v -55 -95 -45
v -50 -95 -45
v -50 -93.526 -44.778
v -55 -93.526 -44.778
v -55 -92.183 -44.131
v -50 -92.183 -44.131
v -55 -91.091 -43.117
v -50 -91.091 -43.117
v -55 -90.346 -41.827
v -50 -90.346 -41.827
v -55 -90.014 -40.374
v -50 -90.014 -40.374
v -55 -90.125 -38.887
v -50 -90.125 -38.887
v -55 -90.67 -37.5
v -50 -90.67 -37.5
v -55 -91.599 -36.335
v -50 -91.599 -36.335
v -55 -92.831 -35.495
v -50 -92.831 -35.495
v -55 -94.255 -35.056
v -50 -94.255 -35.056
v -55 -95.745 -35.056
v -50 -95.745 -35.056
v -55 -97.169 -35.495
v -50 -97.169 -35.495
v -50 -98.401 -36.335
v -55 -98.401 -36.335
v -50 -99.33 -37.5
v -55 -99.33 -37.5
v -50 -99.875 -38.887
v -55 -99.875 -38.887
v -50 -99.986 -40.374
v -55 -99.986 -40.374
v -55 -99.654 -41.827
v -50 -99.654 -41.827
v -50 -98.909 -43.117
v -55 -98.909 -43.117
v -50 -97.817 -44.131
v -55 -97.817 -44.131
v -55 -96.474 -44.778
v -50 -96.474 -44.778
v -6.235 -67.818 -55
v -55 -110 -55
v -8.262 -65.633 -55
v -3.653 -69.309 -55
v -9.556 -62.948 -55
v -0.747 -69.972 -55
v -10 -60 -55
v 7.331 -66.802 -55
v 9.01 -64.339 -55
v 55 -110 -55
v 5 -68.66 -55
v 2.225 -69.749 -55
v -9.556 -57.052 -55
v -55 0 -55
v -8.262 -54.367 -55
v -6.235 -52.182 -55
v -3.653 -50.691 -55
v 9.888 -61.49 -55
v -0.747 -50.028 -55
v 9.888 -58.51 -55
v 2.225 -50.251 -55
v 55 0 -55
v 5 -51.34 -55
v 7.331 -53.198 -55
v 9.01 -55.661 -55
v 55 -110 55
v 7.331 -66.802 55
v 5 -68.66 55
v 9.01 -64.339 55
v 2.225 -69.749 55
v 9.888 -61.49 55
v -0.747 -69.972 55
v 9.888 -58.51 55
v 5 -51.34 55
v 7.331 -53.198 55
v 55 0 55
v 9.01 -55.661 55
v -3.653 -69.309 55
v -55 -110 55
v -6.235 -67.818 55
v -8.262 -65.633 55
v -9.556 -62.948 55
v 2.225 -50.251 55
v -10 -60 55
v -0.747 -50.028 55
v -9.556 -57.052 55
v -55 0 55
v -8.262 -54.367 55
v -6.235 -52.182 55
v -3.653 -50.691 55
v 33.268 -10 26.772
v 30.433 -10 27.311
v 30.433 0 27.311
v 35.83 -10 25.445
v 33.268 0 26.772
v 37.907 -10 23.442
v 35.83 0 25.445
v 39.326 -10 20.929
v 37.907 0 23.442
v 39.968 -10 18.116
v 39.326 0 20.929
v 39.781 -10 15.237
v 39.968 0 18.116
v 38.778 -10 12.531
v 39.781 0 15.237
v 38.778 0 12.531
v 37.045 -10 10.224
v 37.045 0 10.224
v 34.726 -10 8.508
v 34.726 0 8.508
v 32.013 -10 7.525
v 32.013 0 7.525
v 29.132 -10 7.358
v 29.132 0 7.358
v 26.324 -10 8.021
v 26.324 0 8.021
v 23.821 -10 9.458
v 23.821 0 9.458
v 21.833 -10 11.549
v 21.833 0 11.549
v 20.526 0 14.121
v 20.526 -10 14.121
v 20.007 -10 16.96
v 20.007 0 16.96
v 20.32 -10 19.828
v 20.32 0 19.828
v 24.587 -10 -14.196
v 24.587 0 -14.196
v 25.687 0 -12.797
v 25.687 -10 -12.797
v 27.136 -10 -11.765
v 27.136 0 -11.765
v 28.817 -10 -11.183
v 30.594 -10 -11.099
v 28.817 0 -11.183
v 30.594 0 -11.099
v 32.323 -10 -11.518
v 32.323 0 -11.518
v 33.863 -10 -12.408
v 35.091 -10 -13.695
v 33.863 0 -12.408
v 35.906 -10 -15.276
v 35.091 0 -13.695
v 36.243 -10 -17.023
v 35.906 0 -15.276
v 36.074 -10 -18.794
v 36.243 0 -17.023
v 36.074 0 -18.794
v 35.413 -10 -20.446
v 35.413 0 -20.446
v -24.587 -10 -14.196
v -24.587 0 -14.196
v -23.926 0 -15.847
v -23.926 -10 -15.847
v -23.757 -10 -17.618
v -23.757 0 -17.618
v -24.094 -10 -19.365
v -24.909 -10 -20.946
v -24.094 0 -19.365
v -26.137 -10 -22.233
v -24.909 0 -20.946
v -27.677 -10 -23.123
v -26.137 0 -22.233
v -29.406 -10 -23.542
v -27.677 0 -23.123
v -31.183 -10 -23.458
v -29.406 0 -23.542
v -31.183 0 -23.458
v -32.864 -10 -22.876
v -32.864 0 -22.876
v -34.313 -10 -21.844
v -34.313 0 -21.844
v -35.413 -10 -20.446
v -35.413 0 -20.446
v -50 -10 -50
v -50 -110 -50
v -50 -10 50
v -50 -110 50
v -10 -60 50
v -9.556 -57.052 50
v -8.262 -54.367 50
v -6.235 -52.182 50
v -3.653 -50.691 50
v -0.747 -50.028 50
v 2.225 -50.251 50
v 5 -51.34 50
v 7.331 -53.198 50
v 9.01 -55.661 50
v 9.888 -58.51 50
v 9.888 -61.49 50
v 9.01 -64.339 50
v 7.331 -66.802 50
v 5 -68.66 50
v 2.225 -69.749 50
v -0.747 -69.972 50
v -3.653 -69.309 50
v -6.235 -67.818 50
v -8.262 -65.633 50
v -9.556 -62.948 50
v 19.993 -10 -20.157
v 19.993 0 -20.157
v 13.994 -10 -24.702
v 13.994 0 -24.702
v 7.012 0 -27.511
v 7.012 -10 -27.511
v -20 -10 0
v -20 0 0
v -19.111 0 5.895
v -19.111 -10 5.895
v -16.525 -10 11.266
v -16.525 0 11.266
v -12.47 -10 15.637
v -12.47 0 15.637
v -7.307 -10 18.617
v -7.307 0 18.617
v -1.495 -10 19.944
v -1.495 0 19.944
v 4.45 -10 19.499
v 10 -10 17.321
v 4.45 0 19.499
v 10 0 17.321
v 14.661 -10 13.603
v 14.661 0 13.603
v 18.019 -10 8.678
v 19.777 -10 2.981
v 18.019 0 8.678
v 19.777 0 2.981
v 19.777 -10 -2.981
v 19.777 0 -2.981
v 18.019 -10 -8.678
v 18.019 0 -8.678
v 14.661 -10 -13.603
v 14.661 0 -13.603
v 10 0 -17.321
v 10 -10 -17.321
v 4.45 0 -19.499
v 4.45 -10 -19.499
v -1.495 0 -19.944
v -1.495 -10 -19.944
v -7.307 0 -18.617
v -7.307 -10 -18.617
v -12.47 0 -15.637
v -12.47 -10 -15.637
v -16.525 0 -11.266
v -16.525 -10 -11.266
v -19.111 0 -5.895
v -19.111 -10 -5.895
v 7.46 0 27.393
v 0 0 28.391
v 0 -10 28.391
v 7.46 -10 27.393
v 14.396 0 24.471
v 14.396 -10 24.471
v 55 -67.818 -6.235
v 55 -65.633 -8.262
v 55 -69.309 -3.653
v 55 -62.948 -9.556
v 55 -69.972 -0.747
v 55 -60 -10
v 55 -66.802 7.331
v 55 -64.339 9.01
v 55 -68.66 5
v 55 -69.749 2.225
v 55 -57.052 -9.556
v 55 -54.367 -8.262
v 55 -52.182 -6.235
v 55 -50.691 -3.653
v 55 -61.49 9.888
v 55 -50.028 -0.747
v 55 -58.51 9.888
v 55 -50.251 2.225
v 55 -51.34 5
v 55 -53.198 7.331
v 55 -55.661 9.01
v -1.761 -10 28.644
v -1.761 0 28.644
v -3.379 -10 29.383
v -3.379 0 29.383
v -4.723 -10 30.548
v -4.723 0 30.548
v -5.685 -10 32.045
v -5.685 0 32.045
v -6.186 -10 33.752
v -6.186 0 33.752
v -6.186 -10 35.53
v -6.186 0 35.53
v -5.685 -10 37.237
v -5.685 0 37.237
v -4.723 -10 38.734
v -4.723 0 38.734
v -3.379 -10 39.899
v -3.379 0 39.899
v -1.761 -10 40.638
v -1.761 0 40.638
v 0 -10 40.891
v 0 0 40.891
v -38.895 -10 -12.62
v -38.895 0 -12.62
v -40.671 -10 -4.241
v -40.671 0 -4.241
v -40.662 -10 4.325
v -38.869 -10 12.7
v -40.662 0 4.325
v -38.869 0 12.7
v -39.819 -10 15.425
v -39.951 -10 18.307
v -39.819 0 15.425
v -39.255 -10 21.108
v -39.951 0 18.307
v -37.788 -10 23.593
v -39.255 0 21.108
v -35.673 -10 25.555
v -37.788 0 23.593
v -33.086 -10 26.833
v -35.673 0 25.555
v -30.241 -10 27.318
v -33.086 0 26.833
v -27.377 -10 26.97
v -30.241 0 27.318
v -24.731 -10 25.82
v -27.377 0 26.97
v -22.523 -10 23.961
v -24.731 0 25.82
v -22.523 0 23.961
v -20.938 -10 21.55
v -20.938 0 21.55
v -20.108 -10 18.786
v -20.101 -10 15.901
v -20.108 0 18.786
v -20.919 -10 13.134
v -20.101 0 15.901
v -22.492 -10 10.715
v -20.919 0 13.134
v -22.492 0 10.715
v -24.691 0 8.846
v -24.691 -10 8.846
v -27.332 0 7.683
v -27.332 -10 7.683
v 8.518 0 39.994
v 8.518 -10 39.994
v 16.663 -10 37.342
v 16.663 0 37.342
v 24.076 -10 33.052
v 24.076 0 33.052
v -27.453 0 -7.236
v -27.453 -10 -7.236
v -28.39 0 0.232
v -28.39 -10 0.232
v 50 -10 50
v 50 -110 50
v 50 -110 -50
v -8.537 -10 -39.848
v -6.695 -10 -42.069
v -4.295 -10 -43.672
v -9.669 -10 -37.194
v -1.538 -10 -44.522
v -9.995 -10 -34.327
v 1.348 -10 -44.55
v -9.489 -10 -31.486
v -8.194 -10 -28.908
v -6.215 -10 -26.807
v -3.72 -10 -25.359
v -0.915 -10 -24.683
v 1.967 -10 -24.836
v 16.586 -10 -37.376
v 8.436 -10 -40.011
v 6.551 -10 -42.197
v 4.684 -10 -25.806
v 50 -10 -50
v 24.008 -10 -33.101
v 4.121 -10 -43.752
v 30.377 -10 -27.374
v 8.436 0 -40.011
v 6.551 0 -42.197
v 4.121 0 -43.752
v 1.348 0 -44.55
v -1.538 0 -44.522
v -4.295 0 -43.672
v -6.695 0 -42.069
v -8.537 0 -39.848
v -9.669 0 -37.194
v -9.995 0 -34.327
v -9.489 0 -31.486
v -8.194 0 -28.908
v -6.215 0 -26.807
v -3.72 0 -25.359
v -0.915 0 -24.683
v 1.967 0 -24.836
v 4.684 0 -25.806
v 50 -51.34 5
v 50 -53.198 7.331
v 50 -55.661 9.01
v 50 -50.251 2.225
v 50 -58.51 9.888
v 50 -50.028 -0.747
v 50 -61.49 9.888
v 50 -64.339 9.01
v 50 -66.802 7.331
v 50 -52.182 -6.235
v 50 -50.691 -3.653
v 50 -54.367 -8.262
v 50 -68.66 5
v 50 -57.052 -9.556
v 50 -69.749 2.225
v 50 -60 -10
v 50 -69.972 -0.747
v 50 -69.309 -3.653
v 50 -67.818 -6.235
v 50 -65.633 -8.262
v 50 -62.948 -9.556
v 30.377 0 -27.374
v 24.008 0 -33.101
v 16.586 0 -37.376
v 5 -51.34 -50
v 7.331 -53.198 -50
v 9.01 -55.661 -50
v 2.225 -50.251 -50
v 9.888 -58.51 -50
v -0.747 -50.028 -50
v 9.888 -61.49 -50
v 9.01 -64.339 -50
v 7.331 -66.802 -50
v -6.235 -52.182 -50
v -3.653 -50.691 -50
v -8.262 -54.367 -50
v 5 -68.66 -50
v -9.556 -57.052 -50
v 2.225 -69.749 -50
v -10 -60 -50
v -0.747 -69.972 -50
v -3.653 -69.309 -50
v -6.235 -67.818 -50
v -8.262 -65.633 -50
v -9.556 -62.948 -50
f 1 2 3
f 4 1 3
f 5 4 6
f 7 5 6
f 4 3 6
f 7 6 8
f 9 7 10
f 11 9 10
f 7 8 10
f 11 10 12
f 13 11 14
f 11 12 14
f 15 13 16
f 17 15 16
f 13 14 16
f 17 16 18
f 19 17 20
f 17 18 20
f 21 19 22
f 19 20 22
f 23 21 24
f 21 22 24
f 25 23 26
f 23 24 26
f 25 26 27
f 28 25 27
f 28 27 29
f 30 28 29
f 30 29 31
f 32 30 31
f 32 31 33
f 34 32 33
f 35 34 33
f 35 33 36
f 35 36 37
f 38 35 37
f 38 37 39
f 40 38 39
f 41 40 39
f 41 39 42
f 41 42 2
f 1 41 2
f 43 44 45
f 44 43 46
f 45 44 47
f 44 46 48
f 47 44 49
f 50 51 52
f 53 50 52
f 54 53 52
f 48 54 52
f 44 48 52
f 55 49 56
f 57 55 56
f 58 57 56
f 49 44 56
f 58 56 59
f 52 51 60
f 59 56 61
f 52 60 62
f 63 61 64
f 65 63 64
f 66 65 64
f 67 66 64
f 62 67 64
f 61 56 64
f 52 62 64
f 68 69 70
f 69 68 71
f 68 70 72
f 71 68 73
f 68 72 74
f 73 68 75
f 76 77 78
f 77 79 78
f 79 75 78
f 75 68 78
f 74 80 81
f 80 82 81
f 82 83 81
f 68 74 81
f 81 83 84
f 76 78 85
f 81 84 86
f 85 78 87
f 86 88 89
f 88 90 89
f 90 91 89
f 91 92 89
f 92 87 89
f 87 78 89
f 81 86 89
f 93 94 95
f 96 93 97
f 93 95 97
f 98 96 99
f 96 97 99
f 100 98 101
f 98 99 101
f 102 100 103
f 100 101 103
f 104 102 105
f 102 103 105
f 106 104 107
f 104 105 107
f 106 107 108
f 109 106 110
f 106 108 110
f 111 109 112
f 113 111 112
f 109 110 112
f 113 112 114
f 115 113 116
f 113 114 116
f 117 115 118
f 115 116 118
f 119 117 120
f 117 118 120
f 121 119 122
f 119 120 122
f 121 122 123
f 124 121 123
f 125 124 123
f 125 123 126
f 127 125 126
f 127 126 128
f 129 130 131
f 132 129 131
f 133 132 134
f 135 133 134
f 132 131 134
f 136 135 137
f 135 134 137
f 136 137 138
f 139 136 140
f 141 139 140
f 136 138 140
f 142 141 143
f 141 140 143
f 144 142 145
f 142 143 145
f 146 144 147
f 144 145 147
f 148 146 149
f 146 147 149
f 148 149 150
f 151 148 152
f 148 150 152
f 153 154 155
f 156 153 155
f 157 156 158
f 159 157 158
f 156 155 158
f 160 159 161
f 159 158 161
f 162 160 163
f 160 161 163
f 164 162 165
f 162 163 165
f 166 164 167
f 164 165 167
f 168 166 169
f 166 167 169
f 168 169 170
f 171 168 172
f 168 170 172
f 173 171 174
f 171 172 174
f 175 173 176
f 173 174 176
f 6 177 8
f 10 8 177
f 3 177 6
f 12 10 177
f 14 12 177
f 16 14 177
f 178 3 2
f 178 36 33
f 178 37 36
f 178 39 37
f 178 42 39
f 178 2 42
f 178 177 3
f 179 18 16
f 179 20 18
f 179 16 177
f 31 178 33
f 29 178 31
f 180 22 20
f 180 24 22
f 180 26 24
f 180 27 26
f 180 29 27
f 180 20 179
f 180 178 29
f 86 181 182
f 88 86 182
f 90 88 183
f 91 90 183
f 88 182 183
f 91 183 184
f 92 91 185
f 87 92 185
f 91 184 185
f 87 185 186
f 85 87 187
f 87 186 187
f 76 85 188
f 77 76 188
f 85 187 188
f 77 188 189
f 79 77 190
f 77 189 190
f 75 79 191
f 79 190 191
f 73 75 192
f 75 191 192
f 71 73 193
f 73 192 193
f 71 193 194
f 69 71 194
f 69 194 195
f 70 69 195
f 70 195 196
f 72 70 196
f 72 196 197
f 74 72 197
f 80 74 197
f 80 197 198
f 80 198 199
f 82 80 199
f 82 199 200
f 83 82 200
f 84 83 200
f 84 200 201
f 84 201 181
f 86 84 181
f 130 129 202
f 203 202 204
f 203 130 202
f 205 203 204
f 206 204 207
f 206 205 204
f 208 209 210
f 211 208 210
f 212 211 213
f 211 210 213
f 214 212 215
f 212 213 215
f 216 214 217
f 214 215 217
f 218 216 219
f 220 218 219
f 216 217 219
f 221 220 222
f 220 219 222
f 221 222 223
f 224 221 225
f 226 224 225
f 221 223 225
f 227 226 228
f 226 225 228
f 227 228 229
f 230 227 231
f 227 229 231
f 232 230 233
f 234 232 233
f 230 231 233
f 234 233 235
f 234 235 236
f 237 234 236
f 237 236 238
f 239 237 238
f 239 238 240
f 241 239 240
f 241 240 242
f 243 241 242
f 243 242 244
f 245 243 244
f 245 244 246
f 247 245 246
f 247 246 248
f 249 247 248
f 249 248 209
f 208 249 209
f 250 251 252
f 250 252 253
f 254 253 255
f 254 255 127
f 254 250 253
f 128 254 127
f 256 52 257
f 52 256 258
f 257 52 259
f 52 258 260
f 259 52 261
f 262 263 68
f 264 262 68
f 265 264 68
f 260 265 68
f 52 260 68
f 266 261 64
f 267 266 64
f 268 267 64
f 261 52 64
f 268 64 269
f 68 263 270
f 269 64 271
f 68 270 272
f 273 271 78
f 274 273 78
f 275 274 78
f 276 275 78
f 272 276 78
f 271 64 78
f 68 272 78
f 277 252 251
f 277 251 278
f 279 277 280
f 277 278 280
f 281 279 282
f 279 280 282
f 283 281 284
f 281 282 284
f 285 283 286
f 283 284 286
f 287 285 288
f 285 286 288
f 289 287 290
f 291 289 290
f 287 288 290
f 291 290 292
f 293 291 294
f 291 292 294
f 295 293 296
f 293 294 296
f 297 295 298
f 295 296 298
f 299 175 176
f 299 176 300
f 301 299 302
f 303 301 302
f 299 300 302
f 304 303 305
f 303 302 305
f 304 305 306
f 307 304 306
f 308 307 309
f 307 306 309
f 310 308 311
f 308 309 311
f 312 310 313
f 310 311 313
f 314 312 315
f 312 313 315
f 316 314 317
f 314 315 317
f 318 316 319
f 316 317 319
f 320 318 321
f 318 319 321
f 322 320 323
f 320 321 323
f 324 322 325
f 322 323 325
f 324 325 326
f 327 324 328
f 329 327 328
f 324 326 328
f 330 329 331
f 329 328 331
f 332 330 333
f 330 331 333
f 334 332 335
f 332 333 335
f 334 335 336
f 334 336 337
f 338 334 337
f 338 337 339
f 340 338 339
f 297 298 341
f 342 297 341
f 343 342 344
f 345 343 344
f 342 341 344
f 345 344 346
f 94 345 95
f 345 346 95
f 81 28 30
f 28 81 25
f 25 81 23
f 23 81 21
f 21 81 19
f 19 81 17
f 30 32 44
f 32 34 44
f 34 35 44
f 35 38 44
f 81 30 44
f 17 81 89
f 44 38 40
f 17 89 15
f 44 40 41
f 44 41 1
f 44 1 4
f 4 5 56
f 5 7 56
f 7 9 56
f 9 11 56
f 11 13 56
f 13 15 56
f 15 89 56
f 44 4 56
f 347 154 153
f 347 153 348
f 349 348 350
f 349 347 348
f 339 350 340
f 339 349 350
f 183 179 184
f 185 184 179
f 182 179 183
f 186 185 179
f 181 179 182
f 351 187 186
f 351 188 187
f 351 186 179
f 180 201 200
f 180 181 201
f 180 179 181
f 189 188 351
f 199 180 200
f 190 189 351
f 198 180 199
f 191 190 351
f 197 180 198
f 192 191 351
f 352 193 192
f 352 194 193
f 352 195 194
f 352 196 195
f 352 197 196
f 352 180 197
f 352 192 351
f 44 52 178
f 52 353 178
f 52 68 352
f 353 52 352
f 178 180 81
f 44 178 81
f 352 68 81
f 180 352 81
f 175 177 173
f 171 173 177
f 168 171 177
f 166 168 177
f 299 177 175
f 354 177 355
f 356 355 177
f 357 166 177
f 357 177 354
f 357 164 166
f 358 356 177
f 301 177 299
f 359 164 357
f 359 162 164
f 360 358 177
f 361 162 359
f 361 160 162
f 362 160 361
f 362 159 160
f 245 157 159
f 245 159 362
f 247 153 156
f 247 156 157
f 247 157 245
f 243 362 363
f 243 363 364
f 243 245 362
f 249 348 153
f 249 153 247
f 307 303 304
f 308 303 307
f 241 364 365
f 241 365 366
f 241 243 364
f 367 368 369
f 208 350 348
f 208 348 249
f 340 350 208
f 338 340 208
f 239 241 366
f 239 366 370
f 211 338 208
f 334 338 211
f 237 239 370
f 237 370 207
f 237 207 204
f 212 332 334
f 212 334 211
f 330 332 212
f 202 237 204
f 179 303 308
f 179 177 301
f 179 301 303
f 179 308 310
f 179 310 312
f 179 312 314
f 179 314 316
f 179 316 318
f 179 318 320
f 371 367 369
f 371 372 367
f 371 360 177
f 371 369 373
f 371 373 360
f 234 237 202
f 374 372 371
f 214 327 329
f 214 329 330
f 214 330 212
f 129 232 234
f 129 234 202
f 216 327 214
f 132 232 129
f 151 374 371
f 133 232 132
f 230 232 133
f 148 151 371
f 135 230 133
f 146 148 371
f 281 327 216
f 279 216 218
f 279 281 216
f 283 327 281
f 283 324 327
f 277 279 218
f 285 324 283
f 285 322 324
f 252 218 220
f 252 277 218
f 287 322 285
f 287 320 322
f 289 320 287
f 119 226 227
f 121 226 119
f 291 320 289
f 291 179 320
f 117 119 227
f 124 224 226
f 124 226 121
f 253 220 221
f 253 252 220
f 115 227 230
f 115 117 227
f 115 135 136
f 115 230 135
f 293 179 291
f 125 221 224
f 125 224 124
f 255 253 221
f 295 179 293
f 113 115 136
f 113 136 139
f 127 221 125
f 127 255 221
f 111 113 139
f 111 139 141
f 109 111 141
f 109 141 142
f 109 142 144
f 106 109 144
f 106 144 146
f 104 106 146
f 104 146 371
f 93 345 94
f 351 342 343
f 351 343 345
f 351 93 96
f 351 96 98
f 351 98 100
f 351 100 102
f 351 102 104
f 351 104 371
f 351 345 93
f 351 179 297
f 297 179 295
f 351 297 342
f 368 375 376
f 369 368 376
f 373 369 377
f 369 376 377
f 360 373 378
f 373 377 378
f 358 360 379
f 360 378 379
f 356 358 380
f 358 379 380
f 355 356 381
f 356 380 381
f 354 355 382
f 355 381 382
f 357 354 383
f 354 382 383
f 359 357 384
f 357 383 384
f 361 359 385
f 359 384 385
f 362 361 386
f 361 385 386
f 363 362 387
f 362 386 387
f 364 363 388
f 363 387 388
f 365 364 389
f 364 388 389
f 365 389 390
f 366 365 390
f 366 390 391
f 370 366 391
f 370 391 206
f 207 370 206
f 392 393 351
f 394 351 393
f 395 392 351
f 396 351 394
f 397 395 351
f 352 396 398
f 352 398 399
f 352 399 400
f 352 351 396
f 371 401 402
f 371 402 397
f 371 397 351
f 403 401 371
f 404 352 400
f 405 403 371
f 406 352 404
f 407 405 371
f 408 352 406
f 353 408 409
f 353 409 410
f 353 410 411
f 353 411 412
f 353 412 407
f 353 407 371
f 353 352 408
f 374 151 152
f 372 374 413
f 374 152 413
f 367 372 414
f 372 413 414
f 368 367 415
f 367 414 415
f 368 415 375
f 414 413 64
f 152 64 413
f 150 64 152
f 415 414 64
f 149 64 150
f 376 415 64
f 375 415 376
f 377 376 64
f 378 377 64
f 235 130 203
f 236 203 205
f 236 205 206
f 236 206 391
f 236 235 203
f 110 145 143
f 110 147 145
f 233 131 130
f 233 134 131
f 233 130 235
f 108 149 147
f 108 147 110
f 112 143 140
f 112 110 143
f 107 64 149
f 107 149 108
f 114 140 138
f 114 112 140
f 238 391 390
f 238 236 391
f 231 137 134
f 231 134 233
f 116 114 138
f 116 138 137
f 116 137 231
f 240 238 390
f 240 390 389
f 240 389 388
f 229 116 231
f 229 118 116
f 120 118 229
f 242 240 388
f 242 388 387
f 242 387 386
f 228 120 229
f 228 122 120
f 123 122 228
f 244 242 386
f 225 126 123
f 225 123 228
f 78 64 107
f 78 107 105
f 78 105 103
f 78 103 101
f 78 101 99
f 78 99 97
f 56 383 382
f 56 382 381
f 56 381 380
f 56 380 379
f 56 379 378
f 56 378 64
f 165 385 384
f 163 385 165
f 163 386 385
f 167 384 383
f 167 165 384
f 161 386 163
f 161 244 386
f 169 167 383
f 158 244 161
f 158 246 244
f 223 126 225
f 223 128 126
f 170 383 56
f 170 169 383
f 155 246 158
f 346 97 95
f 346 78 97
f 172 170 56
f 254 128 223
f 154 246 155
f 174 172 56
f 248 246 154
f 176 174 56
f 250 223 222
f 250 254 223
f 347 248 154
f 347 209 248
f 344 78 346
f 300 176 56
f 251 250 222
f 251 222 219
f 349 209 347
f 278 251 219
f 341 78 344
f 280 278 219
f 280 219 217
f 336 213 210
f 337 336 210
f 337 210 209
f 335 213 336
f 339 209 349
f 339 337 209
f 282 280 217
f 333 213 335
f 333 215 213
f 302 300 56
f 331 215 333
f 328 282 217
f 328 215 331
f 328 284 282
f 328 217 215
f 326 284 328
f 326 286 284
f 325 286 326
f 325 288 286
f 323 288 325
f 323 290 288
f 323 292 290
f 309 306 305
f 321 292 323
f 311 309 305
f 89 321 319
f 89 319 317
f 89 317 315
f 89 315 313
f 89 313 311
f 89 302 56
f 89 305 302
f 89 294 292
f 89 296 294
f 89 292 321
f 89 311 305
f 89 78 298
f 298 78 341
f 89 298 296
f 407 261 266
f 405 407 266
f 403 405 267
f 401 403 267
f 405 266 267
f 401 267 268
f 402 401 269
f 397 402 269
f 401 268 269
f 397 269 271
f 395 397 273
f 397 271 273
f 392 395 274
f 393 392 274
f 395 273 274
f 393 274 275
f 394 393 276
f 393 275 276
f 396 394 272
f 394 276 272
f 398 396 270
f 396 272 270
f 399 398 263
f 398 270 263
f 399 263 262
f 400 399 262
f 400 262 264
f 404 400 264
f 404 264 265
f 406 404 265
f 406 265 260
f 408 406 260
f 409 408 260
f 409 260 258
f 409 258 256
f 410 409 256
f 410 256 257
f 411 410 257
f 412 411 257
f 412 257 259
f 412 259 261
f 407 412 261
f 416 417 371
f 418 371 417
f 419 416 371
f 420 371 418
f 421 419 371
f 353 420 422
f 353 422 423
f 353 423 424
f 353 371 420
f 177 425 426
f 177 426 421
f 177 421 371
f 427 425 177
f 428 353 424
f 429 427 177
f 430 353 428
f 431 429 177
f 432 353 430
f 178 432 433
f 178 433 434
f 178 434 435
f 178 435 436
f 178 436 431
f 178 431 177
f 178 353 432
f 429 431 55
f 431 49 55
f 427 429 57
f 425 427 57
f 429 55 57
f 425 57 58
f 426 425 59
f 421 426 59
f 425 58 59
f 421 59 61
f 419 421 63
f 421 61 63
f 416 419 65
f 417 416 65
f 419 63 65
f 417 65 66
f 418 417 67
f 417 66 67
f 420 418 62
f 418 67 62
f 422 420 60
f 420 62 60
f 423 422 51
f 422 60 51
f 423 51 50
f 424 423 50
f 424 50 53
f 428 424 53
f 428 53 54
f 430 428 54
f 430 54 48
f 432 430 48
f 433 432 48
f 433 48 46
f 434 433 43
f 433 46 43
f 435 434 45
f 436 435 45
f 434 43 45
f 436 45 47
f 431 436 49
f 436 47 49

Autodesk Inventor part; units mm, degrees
ref_plane "YZ Plane" through (0, 0, 0) normal (1, 0, 0) x (0, 1, 0)
ref_plane "XZ Plane" through (0, 0, 0) normal (0, 1, 0) x (-1, 0, 0)
ref_plane "XY Plane" through (0, 0, 0) normal (0, 0, 1) x (1, 0, 0)
sketch "Sketch1" plane through (0, 0, 0) normal (0, 1, 0) x (-1, 0, 0)
  line L0 (0, -34.641) -> (30, 17.3205) construction
  line L1 (30, 17.3205) -> (-30, 17.3205) construction
  line L2 (-30, 17.3205) -> (0, -34.641) construction
  circle A0 centre (0, 0) radius 34.641 construction
  circle A1 centre (0, -34.641) radius 10
  circle A2 centre (-30, 17.3205) radius 10
  circle A3 centre (30, 17.3205) radius 10
  circle A4 centre (0, 0) radius 20
  line L3 (55, -55) -> (-55, -55)
  line L4 (-55, -55) -> (-55, 55)
  line L5 (-55, 55) -> (55, 55)
  line L6 (55, 55) -> (55, -55)
  circle A5 centre (0, 0) radius 45 construction
  point P0 (0, -55)
  point P1 (55, 0)
  dimension "d0" = 60
  dimension "d1" = 20
  dimension "d2" = 40
  dimension "d3" = 90
  dimension "d4" = 55
extrude "Extrusion1" add sketch "Sketch1" against normal blind 110
sketch "Sketch2" plane through (0, 0, 0) normal (0, 1, 0) x (1, 0, 0)
  circle A0 centre (0, 0) radius 20 projected
  circle A1 centre (-30, -17.3205) radius 10 projected
  circle A2 centre (30, -17.3205) radius 10 projected
  circle A3 centre (0, 34.641) radius 10 projected
  line L0 (-55, 55) -> (55, 55) projected
  line L1 (-55, -55) -> (-55, 55) projected
  line L2 (55, -55) -> (-55, -55) projected
  line L3 (55, 55) -> (55, -55) projected
  circle A4 centre (0, 34.641) radius 6.25
  circle A5 centre (-30, 17.3205) radius 6.25
  circle A6 centre (-30, -17.3205) radius 6.25
  circle A7 centre (0, -34.641) radius 6.25
  circle A8 centre (30, -17.3205) radius 6.25
  circle A9 centre (30, 17.3205) radius 6.25
  arc A10 (-35.4127, 20.4455) -> (-35.4127, -20.4455) centre (0, 0) ccw
  arc A11 (-24.5873, 14.1955) -> (-24.5873, -14.1955) centre (0, 0) ccw
  arc A12 (0, -40.891) -> (35.4127, -20.4455) centre (0, 0) ccw
  arc A13 (35.4127, 20.4455) -> (0, 40.891) centre (0, 0) ccw
  arc A14 (0, -28.391) -> (24.5873, -14.1955) centre (0, 0) ccw
  arc A15 (24.5873, 14.1955) -> (0, 28.391) centre (0, 0) ccw
  dimension "d7" = 12.5
  dimension "d10" = 360
extrude "Extrusion2" cut sketch "Sketch2" against normal through all contours A11 A6 A10 A1 | A1 A10 A5 A11 | A5 | A14 A8 A12 A2 | A2 A12 A7 A14 | A7 | A3 A15 A4 A13 | A3 A13 A9 A15 | A9 picked at (-34.5635, -9.9186) picked at (25.4365, -24.7224) picked at (8.6846, 33.9839)
sketch "Sketch3" plane through (0, -110, 0) normal (0, -1, 0) x (1, 0, 0)
  line L0 (-55, -55) -> (55, -55) projected
  line L1 (55, -55) -> (55, 55) projected
  line L2 (55, 55) -> (-55, 55) projected
  line L3 (-55, 55) -> (-55, -55) projected
  arc A0 (7.0121, -27.5115) -> (24.5873, -14.1955) centre (0, 0) ccw projected
  arc A1 (35.4127, -20.4455) -> (24.5873, -14.1955) centre (30, -17.3205) ccw projected
  arc A2 (8.4355, -40.0115) -> (35.4127, -20.4455) centre (0, 0) ccw projected
  arc A3 (7.0121, -27.5115) -> (8.4355, -40.0115) centre (0, -34.641) ccw projected
  arc A4 (20.3196, 19.8284) -> (0, 28.391) centre (0, 0) ccw projected
  arc A5 (0, 40.891) -> (0, 28.391) centre (0, 34.641) ccw projected
  arc A6 (30.4332, 27.3111) -> (0, 40.891) centre (0, 0) ccw projected
  arc A7 (20.3196, 19.8284) -> (30.4332, 27.3111) centre (30, 17.3205) ccw projected
  arc A8 (-27.3317, 7.6831) -> (-24.5873, -14.1955) centre (0, 0) ccw projected
  arc A9 (-35.4127, -20.4455) -> (-24.5873, -14.1955) centre (-30, -17.3205) ccw projected
  arc A10 (-38.8687, 12.7003) -> (-35.4127, -20.4455) centre (0, 0) ccw projected
  arc A11 (-27.3317, 7.6831) -> (-38.8687, 12.7003) centre (-30, 17.3205) ccw projected
  circle A12 centre (0, 0) radius 20 projected
  line L4 (-50, 50) -> (50, 50)
  line L5 (50, 50) -> (50, -50)
  line L6 (50, -50) -> (-50, -50)
  line L7 (-50, -50) -> (-50, 50)
  dimension "d14" = 5
extrude "Extrusion3" cut sketch "Sketch3" against normal blind 100 contours A0 A1 A2 A3 | A4 A5 A6 A7 | A8 A9 A10 A11 | A12 | L4 L5 L6 L7
sketch "Sketch5" plane through (55, 0, -55) normal (0, 0, -1) x (-1, 0, 0)
  circle A0 centre (55, -60) radius 10
  line L0 (110, -110) -> (0, -110) projected
  line L1 (110, 0) -> (0, 0) projected
  point P0 (55, 0)
  point P1 (55, -110)
  dimension "d17" = 60
  dimension "d20" = 20
extrude "Extrusion4" cut sketch "Sketch5" against normal through all
sketch "Sketch6" plane through (55, 0, 55) normal (1, 0, 0) x (0, 0, -1)
  circle A0 centre (55, -60) radius 10
  line L0 (110, -110) -> (0, -110) projected
  line L1 (110, 0) -> (0, 0) projected
  point P0 (55, 0)
  point P1 (55, -110)
  dimension "d21" = 20
  dimension "d22" = 60
extrude "Extrusion5" cut sketch "Sketch6" against normal up to next
sketch "Sketch7" plane through (-50, -110, 50) normal (1, 0, 0) x (0, 0, -1)
  circle A0 centre (90, 15) radius 5
  line L0 (105, 110) -> (105, 0) projected
  line L1 (-5, 0) -> (105, 0) projected
  point P0 (50, 110)
  dimension "d25" = 10
  dimension "d26" = 15
  dimension "d27" = 15
extrude "Extrusion6" cut sketch "Sketch7" against normal through all
properties part number "Case1" material "Steel, Mild, Welded"
